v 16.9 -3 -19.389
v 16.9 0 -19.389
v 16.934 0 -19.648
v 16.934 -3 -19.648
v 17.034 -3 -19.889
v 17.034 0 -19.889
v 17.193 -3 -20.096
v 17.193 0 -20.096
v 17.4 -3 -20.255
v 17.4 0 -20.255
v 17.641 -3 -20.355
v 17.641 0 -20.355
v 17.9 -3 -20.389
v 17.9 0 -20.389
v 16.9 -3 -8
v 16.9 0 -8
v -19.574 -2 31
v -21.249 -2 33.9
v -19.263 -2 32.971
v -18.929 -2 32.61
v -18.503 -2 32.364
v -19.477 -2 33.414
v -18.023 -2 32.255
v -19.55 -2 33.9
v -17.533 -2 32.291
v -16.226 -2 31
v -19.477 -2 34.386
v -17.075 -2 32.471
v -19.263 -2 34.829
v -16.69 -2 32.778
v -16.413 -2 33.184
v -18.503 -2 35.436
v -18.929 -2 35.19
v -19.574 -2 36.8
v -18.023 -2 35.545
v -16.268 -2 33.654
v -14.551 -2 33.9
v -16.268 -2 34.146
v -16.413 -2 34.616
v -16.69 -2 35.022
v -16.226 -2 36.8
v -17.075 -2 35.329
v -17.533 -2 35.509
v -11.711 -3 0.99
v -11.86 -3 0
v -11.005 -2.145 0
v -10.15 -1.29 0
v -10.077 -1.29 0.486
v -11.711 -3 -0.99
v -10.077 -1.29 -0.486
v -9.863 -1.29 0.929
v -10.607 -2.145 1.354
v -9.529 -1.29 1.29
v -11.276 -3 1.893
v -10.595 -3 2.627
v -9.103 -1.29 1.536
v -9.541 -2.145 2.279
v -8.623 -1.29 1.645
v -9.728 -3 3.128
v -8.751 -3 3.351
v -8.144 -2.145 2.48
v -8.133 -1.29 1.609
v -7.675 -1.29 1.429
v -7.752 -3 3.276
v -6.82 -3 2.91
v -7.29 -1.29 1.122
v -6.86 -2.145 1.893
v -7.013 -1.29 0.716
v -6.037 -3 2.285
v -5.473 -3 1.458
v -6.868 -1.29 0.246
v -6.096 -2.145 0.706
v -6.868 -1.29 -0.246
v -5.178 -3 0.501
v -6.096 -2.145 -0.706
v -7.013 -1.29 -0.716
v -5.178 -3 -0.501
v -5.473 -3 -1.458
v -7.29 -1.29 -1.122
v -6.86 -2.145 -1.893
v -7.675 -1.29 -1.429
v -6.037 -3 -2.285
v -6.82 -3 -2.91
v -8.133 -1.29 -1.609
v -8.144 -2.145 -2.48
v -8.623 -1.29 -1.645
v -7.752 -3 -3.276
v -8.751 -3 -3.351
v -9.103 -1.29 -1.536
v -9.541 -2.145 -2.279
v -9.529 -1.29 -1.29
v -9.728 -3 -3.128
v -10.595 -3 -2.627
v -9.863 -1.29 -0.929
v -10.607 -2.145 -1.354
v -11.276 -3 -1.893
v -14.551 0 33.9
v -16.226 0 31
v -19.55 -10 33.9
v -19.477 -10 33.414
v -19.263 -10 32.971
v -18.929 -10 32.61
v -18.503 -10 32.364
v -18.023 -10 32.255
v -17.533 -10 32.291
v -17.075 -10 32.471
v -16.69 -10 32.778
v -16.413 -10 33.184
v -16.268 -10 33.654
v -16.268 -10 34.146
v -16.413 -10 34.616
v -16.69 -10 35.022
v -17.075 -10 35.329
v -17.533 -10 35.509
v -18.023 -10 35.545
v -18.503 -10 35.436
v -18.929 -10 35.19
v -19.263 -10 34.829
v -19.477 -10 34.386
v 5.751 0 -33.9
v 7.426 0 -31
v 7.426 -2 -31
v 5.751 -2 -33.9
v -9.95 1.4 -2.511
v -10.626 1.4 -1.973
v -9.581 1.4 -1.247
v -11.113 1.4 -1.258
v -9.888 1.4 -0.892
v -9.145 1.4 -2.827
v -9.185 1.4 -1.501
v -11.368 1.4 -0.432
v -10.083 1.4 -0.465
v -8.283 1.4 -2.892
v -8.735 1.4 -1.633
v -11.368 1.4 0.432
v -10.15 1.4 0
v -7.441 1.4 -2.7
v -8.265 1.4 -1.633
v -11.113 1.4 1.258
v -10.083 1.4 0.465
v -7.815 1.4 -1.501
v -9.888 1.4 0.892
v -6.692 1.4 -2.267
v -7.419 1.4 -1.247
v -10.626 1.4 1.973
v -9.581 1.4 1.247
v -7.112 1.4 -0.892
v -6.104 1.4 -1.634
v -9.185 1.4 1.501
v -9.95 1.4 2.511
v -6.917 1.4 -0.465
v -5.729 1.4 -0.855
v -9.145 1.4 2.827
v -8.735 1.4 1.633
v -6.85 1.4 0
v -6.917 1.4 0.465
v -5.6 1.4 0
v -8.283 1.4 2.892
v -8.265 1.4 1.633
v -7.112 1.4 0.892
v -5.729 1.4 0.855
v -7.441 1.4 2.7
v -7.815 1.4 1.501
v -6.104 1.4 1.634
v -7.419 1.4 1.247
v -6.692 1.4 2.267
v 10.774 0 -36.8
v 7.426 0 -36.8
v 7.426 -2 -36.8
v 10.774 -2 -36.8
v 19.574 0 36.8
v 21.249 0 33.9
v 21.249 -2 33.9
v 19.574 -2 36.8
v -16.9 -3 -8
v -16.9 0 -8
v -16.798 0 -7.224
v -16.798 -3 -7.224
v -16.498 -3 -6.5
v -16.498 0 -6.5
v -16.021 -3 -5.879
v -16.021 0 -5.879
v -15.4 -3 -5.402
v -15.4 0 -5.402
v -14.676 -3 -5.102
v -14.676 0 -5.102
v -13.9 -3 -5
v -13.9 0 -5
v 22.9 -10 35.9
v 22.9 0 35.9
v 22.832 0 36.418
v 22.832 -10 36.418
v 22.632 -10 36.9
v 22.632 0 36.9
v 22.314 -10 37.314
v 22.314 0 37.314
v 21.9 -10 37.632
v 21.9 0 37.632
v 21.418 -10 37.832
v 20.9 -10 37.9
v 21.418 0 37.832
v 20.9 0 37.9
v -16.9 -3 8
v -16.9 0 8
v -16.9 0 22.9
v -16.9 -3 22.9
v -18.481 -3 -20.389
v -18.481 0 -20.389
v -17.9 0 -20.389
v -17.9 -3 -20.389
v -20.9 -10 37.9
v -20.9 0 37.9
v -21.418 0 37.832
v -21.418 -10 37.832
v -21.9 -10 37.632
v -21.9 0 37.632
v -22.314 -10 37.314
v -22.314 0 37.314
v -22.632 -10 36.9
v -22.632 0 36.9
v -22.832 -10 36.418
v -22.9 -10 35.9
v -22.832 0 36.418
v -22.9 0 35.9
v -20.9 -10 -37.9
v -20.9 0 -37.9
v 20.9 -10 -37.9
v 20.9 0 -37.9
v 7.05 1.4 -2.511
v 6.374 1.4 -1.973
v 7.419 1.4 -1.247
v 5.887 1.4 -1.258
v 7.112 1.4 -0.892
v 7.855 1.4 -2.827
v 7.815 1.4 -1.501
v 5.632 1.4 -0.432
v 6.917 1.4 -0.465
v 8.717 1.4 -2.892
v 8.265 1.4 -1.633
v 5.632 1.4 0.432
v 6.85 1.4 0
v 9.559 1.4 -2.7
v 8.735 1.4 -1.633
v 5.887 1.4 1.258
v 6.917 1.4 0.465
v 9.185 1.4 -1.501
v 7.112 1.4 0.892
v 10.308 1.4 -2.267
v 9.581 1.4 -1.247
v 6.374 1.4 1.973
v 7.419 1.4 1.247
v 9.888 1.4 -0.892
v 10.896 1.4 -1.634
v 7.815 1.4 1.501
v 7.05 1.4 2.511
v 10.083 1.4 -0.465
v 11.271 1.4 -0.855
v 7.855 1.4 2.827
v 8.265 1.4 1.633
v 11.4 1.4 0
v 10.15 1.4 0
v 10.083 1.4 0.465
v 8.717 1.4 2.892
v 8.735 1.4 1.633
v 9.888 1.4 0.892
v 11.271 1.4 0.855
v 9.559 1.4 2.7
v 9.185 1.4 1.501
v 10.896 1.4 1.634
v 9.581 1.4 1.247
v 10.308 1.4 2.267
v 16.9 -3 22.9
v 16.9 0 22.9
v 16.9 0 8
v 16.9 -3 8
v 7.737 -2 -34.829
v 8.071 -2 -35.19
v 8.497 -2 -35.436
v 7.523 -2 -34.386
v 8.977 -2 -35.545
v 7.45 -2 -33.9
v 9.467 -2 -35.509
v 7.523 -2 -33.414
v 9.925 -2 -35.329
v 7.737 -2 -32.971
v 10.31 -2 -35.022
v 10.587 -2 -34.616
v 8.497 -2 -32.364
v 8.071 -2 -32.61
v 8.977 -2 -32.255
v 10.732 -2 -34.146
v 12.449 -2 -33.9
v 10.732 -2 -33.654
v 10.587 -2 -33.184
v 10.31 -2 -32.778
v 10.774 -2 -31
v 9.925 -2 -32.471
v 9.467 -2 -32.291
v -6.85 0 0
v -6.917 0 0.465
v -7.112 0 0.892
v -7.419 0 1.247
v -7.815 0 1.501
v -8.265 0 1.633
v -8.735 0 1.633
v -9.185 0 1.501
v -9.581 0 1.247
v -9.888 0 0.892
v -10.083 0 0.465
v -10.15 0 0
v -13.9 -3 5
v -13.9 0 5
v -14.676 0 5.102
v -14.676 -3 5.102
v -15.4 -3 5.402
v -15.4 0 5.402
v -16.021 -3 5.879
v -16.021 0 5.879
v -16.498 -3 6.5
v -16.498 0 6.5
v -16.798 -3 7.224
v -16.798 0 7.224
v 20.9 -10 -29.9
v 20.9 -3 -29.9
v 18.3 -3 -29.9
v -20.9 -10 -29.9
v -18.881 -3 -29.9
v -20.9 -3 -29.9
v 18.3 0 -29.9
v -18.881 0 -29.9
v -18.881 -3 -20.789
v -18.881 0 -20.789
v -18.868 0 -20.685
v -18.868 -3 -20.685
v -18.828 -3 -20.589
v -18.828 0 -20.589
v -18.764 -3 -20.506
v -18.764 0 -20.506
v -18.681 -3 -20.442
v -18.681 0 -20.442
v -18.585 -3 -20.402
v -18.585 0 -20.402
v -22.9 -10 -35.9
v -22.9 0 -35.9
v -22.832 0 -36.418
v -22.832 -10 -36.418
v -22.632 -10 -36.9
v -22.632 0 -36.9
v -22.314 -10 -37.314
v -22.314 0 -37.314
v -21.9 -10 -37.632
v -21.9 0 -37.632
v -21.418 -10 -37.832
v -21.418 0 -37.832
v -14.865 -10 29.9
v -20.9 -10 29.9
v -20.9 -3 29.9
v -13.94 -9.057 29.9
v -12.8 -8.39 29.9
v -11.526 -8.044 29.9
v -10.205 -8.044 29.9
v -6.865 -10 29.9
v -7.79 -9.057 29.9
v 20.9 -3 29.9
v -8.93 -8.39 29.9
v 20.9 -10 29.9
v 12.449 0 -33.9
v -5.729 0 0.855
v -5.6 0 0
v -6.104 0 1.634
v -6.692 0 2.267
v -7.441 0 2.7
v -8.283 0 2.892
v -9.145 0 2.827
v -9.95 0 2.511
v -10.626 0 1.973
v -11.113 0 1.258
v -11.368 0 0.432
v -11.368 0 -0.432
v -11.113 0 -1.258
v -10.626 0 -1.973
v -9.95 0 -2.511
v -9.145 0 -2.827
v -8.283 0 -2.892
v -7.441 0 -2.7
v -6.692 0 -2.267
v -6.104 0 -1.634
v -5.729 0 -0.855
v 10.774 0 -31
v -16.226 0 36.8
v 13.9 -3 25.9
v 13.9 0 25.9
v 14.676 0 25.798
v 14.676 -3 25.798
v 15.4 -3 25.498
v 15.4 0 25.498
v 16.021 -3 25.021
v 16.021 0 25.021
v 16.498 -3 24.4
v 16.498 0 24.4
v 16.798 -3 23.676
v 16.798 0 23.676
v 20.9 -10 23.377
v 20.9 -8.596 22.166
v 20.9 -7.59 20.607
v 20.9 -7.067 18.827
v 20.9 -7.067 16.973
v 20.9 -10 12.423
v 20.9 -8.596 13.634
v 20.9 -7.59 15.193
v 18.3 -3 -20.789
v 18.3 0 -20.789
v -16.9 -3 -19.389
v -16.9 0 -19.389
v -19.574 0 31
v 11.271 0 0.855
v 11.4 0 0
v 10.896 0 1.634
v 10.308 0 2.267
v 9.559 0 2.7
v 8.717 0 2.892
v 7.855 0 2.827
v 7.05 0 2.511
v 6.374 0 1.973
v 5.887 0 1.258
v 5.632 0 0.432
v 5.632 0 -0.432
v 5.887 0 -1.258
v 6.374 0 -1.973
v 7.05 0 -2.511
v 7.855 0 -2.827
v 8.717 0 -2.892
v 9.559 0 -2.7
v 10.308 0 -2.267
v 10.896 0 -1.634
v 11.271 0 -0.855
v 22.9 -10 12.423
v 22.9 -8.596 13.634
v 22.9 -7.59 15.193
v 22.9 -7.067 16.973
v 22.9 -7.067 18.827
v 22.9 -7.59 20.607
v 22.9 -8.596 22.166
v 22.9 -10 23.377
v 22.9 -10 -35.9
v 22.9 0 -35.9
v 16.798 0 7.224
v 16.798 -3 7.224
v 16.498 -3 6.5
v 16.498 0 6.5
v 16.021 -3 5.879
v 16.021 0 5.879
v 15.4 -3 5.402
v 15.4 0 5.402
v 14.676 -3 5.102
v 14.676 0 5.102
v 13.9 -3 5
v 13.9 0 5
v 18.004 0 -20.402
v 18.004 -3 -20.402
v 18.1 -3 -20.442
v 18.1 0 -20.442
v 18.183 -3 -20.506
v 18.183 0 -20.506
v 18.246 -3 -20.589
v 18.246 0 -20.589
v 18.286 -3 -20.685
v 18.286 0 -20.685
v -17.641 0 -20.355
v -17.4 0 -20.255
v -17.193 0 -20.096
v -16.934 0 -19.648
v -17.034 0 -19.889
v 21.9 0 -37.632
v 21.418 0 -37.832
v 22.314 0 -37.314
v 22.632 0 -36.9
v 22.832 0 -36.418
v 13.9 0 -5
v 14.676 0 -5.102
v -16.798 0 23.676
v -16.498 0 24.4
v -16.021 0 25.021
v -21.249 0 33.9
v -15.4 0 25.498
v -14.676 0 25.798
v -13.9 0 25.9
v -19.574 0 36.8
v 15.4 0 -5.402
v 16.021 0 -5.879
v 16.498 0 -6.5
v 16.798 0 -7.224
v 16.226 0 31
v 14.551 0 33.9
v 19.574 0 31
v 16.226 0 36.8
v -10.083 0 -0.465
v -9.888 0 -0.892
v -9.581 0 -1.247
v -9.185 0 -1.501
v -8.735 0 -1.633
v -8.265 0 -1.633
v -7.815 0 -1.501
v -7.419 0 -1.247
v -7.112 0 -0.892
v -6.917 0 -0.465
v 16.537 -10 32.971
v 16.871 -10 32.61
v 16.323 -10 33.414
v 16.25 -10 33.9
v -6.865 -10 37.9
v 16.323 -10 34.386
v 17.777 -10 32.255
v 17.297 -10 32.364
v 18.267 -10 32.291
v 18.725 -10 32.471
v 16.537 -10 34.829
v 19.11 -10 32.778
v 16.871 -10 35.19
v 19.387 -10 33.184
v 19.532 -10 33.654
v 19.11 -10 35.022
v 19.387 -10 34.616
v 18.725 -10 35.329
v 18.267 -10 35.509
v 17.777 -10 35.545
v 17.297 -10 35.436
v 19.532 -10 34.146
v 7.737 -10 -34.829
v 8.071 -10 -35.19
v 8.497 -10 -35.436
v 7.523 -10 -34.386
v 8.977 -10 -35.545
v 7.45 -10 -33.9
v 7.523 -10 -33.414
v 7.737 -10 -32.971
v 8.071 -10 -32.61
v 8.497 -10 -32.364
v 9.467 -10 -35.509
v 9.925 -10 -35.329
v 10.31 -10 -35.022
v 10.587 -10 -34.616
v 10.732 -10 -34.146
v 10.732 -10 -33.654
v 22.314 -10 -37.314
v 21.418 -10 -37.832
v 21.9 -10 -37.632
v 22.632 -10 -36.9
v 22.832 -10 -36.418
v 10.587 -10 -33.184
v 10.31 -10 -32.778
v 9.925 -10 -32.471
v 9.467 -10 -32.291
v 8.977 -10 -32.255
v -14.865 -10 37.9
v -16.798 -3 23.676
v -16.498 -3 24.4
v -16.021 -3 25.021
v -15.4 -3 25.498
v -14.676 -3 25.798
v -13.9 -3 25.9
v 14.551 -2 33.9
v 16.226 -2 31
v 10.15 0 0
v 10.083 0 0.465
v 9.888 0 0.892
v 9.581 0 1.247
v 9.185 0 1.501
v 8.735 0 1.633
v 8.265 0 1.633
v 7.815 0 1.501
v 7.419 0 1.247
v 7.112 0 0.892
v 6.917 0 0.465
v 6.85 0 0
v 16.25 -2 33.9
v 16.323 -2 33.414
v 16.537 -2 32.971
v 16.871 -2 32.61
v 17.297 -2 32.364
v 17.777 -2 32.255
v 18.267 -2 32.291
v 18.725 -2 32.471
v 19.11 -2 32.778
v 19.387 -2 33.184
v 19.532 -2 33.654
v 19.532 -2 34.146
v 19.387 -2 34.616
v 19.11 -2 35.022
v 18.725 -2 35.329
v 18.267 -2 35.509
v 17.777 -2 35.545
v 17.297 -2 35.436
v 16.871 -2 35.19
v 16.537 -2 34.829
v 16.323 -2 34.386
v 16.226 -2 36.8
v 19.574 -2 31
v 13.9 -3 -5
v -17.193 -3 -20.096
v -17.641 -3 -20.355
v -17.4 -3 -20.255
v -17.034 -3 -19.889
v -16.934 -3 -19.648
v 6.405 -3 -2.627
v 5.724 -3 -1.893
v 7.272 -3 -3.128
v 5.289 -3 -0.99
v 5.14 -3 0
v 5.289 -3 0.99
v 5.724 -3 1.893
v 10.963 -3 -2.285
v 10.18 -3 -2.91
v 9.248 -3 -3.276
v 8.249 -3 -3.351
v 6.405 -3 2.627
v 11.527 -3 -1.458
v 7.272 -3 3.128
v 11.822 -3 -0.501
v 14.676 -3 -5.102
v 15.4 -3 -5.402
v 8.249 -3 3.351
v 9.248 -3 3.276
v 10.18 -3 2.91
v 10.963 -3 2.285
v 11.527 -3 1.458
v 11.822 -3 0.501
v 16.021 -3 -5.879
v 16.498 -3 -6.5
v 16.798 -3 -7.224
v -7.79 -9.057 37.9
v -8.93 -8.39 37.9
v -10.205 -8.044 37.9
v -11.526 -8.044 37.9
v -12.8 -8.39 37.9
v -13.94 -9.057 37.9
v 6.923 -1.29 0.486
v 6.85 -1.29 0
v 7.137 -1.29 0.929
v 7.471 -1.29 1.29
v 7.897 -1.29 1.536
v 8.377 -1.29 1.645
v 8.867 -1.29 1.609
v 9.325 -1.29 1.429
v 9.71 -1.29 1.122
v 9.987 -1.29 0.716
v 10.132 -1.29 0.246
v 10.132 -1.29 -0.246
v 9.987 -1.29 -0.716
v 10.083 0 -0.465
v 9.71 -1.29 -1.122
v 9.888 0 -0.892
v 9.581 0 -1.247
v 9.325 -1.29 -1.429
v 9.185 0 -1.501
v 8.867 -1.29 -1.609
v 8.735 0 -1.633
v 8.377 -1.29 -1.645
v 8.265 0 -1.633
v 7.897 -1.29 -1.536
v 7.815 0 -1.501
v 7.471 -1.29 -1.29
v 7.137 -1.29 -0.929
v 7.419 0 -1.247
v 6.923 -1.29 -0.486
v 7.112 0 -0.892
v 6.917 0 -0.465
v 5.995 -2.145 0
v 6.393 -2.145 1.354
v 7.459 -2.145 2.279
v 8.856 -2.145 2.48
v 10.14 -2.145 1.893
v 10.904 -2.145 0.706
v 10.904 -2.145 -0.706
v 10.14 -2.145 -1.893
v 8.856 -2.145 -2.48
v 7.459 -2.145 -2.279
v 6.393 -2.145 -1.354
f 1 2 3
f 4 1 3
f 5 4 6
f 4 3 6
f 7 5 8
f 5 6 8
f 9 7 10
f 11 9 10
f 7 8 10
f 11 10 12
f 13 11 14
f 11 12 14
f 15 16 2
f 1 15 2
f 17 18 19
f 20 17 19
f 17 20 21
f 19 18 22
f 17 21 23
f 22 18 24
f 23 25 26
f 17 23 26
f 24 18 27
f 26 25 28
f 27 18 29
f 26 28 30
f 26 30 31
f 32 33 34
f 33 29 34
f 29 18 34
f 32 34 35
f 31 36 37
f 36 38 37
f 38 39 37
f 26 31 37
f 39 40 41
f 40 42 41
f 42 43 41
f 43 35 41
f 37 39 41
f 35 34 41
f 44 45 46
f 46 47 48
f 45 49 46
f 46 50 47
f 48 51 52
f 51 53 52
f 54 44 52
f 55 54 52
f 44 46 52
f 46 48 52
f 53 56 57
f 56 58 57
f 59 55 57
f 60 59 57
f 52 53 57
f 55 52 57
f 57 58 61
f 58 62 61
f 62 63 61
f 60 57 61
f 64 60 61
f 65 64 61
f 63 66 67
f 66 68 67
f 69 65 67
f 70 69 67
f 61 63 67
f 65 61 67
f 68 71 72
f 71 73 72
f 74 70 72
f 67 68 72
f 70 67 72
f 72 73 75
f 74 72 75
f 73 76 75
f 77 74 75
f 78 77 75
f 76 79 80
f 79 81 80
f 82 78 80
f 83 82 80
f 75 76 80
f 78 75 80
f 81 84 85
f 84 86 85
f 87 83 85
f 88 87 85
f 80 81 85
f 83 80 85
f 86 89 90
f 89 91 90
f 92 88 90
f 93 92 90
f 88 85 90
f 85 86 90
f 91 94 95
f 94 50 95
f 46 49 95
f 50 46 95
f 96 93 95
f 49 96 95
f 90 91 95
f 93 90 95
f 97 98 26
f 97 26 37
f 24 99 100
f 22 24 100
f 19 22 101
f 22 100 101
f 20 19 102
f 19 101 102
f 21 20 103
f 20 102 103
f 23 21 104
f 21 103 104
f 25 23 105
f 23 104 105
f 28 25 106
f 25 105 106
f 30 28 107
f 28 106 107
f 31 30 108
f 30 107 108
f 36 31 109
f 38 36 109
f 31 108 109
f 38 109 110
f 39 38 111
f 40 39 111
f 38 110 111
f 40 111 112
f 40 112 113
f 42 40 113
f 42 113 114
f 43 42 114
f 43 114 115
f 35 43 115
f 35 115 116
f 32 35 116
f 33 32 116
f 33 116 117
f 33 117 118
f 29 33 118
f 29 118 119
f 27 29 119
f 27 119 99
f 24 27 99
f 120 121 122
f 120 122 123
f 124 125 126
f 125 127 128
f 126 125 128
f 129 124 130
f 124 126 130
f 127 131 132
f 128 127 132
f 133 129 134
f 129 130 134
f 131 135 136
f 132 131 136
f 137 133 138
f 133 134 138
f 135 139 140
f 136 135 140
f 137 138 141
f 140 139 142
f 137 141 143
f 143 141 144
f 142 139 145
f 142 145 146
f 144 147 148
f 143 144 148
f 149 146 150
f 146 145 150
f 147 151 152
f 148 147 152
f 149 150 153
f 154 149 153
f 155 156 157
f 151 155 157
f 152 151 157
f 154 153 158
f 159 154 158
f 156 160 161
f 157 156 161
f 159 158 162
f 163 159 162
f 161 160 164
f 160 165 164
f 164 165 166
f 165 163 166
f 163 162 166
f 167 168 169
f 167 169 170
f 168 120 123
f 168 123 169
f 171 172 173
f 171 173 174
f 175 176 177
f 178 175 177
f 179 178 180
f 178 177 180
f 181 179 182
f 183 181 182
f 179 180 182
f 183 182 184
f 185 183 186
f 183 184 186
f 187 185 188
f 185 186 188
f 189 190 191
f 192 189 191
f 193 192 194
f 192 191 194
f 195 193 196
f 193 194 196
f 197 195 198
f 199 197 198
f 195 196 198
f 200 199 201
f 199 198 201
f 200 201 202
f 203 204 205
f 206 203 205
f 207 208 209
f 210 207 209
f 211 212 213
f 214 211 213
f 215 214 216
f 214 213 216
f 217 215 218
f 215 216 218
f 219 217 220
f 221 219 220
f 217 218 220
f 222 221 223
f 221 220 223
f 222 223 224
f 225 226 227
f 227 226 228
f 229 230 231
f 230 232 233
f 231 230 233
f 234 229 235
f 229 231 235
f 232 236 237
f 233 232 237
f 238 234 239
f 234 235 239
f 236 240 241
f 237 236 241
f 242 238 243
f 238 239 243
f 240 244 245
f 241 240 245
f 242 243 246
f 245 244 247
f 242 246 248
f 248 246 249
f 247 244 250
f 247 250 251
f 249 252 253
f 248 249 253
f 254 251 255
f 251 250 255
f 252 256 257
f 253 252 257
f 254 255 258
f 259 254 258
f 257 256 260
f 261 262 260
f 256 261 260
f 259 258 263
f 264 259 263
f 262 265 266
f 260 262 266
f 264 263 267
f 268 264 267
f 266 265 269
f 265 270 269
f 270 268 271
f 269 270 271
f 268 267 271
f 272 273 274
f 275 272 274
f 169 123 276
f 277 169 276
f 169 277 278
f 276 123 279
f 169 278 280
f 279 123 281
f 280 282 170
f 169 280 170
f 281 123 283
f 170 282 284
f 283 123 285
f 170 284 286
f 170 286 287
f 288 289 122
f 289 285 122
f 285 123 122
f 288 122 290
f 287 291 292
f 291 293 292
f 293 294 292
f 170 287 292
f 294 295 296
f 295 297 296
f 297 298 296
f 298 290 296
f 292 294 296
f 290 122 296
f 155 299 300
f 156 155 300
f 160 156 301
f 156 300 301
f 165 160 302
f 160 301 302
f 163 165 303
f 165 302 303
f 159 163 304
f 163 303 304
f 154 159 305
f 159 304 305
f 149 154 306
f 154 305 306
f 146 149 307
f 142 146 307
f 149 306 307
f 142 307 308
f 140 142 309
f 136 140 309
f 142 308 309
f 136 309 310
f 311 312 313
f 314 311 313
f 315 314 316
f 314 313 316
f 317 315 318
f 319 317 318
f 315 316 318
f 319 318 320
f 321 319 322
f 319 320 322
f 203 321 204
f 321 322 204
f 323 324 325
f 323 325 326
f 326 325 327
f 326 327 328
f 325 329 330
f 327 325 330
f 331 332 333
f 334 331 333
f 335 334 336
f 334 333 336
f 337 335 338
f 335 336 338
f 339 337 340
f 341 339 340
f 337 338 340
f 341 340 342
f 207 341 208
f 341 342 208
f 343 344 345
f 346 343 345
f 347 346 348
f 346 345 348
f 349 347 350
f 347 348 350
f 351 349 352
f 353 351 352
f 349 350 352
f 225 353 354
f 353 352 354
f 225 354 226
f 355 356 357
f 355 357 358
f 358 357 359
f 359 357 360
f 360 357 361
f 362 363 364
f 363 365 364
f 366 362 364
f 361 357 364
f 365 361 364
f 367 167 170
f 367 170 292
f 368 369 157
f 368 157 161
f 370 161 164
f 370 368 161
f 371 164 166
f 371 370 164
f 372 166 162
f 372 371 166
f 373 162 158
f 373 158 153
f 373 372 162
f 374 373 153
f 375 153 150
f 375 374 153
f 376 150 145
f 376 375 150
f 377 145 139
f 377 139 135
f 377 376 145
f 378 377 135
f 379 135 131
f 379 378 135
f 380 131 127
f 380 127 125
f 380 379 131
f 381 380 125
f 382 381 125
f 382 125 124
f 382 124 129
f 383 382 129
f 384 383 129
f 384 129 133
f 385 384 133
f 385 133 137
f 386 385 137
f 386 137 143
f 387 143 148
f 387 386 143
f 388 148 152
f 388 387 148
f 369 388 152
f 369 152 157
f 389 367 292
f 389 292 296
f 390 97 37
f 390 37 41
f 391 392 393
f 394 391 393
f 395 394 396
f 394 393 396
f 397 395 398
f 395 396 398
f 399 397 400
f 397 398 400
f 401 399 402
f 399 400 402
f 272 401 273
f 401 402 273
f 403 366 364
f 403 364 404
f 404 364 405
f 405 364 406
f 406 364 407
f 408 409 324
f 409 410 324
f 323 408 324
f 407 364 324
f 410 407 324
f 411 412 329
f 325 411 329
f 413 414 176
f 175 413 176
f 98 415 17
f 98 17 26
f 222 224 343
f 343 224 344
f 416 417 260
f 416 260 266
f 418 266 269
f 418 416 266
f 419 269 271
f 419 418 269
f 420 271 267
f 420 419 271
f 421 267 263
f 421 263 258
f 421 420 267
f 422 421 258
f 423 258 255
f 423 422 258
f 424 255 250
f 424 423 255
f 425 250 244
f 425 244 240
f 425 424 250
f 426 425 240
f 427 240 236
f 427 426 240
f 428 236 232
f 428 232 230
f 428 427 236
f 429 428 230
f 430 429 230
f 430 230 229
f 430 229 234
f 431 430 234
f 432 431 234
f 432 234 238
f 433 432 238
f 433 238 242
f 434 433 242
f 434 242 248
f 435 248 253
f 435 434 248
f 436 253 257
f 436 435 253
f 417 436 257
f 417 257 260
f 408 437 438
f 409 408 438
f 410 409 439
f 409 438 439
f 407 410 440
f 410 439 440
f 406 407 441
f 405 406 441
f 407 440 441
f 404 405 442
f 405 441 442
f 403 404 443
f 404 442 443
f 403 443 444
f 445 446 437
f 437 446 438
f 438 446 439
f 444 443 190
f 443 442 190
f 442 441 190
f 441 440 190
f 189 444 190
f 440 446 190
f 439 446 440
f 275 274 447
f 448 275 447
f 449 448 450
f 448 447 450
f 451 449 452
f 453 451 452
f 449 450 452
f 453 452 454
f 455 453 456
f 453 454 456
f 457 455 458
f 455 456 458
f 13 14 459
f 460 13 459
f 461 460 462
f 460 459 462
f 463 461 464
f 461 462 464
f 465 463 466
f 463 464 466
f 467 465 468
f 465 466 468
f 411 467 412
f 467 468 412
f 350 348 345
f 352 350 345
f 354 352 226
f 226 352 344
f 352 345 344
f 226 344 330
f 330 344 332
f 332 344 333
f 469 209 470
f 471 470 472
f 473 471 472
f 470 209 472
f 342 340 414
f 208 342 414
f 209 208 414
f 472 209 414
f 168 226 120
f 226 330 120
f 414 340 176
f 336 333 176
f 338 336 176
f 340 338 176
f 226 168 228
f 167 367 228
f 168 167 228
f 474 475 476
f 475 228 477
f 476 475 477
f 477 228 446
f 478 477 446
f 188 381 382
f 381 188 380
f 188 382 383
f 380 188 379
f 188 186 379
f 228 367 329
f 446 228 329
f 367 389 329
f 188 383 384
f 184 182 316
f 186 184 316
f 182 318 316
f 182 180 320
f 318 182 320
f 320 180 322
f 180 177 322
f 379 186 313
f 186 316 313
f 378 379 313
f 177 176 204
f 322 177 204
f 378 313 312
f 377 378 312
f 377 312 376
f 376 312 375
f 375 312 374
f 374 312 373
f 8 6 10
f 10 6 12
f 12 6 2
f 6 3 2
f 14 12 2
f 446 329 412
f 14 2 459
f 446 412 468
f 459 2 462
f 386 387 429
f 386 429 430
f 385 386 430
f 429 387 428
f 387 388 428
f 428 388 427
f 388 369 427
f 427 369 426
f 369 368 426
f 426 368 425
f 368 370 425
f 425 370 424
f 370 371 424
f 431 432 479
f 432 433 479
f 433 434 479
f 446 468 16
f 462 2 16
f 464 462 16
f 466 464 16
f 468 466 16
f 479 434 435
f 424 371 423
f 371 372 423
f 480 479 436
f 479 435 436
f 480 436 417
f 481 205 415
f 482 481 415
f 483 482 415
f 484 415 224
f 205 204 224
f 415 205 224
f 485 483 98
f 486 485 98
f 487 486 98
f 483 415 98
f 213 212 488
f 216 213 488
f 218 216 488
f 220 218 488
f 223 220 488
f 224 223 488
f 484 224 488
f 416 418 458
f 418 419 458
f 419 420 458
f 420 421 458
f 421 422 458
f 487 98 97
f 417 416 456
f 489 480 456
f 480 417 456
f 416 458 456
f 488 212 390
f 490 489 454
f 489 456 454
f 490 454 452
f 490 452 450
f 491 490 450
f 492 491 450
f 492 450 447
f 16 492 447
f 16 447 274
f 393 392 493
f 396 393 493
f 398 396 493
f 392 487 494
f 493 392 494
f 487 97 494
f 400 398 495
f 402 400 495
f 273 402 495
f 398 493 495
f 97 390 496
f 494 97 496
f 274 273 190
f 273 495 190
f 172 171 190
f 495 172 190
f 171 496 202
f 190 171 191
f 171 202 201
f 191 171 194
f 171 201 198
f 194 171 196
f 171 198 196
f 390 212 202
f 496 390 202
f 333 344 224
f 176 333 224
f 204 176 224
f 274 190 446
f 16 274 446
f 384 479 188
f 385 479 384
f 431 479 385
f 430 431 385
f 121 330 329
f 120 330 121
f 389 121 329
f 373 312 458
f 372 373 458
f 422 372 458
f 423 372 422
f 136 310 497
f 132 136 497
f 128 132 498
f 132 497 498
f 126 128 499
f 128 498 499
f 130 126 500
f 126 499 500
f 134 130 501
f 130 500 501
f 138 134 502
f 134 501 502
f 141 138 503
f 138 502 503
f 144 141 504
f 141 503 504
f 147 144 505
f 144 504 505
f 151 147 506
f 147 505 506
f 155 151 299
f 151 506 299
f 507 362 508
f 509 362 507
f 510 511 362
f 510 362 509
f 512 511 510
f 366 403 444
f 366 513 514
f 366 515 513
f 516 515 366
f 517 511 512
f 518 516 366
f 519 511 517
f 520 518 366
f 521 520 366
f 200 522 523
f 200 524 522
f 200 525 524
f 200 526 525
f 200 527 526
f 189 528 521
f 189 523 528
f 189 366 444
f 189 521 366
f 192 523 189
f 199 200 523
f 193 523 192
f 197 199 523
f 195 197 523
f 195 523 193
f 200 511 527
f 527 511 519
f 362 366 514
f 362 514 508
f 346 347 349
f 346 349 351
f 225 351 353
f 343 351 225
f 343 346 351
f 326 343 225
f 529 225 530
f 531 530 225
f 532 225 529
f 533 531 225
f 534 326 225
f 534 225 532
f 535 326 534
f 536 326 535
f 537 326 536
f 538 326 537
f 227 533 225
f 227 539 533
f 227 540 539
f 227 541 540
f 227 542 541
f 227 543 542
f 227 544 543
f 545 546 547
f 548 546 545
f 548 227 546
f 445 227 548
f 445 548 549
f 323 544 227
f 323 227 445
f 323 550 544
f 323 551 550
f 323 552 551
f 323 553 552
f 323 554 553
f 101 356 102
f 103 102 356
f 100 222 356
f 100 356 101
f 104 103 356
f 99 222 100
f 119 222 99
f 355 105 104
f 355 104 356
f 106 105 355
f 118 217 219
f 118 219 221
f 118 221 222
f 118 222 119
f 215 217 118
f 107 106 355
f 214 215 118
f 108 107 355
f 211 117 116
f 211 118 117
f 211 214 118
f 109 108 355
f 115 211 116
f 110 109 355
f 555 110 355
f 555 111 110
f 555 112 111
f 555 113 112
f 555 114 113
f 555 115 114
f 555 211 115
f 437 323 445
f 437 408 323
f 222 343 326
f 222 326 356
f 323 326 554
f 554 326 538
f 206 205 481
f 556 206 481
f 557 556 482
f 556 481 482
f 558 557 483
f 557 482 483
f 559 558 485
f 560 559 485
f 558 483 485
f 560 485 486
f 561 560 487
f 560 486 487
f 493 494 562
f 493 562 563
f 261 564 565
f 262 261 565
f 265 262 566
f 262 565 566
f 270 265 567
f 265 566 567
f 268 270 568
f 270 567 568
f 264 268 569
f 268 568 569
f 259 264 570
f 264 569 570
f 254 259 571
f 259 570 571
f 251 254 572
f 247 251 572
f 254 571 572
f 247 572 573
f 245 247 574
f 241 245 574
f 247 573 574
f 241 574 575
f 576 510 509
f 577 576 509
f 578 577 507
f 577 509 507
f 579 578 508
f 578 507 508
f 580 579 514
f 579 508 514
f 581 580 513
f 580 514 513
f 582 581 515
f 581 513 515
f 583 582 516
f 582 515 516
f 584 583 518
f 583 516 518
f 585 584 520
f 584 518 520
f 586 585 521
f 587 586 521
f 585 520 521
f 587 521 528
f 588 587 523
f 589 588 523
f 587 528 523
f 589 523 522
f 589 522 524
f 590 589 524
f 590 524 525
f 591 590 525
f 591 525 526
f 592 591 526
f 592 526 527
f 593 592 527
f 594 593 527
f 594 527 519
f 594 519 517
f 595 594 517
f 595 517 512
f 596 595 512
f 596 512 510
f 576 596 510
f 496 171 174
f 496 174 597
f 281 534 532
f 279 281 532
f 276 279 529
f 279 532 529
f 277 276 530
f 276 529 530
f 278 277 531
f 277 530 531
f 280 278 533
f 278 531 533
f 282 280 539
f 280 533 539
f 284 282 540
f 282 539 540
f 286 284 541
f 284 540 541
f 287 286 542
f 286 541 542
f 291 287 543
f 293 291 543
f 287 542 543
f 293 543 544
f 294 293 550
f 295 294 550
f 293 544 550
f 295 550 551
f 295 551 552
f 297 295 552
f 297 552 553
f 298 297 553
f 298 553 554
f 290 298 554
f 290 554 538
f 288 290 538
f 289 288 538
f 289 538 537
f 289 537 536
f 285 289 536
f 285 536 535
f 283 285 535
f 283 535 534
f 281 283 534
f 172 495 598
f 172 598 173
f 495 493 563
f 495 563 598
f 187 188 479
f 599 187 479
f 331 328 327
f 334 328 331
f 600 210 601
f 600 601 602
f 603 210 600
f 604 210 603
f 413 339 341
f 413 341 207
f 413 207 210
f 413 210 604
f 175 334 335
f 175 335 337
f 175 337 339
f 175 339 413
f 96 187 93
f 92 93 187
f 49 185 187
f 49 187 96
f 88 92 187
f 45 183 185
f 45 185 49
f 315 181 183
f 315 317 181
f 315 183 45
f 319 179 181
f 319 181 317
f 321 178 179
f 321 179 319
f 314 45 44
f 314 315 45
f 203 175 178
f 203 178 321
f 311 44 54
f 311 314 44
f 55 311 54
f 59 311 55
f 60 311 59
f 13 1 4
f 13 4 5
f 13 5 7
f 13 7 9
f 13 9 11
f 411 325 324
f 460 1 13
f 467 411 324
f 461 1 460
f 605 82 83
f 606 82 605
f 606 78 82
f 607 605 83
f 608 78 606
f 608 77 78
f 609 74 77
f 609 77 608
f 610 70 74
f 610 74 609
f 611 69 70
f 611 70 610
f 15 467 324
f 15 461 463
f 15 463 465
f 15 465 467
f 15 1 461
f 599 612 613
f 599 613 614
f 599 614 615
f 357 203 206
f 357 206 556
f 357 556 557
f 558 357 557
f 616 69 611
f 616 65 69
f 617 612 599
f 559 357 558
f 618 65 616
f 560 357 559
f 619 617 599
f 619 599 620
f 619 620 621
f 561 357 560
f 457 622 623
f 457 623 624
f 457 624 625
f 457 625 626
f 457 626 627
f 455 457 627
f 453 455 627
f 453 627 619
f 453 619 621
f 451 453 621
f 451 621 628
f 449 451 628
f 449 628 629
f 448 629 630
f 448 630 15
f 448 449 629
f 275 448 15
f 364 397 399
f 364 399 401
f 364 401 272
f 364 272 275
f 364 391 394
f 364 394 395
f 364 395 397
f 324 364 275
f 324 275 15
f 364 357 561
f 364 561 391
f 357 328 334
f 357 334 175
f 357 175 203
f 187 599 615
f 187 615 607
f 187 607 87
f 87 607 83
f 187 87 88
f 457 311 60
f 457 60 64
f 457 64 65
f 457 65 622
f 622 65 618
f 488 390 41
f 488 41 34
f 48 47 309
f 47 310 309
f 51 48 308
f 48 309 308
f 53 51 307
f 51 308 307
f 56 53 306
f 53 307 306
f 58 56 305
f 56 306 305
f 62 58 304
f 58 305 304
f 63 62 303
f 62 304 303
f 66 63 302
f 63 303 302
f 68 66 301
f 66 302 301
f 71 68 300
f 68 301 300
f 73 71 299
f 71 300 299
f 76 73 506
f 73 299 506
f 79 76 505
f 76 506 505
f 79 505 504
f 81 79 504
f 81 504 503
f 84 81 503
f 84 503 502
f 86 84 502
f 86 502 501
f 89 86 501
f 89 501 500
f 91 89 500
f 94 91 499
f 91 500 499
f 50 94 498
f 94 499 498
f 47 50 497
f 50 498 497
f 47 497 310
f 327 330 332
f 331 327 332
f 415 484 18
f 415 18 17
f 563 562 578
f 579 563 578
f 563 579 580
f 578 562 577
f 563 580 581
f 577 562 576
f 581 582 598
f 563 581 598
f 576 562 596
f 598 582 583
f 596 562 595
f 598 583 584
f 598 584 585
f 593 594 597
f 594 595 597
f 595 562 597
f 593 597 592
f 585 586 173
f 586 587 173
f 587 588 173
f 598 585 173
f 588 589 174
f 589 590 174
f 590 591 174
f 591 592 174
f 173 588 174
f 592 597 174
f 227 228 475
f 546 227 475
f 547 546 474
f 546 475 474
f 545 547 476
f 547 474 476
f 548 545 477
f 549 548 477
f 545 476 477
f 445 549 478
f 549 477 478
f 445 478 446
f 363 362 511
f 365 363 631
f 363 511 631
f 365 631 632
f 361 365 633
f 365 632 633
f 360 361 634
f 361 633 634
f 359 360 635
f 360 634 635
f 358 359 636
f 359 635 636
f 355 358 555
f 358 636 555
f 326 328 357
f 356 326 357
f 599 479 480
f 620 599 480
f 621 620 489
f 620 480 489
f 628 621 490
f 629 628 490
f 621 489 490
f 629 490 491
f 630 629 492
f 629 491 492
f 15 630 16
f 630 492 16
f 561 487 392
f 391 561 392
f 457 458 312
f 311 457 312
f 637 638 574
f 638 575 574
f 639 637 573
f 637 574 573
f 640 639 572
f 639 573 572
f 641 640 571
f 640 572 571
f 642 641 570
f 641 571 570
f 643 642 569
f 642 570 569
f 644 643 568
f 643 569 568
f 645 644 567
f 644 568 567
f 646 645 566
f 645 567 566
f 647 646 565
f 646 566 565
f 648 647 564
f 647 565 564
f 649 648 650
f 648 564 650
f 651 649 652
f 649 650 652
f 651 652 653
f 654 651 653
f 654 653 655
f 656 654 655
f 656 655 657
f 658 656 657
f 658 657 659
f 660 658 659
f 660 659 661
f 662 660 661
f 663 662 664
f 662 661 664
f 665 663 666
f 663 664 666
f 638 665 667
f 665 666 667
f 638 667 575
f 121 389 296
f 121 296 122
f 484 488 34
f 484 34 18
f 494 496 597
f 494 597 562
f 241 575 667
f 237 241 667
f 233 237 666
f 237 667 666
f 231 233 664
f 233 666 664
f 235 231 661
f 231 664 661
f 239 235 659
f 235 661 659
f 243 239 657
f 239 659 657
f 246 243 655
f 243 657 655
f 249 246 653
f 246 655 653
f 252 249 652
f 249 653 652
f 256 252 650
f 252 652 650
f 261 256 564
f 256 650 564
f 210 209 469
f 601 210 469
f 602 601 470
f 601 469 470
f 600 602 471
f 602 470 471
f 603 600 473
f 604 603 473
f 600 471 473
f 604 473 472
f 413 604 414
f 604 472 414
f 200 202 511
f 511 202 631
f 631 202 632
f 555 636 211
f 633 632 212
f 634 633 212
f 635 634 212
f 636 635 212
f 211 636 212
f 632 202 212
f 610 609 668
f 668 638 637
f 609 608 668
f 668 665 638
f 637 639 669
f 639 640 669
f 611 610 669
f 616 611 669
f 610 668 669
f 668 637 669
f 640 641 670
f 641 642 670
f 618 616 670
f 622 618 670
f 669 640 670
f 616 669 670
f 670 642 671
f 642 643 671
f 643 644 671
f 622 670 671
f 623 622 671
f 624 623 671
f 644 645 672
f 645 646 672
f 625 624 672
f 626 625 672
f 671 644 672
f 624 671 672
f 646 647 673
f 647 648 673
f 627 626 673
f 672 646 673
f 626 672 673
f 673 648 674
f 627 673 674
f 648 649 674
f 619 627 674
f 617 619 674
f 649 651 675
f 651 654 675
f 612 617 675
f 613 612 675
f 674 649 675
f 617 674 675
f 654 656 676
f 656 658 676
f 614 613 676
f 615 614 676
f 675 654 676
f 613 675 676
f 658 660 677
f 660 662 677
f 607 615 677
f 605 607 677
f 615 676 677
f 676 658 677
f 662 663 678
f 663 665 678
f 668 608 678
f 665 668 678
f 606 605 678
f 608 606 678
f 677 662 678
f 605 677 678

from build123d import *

# Parameters (mm, degrees)
F1_DEPTH        = 10
F0_R            = 2.9
F2_DEPTH        = 3
F3_R            = 6.5
F4_DEPTH        = 4
F5_R            = 5
F6_DEPTH        = 12
F7_DEPTH        = 2
F8_D            = 3.3
F8_DEPTH        = 13.8
F8_START        = 2
F8_TIP          = 0.9914200214
F9_DEPTH        = 1.4
F10_D           = 3.3
F10_DEPTH       = 8
F10_TIP         = 0.9914200214
F12_D           = 3.3
F12_DEPTH       = 8
F12_CSINK_D     = 6.72
F12_CSINK_ANGLE = 90
F12_TIP         = 0.9914200214


with BuildPart() as f1:
    # F0 (on Front) → F1 (new body)
    with BuildSketch(Plane.XZ):
        with BuildLine():
            Line((20.9, 37.9), (17.9, 37.9))
            Line((17.9, 37.9), (-17.9, 37.9))
            Line((-17.9, 37.9), (-20.9, 37.9))
            ThreePointArc((-20.9, 37.9), (-22.3142135624, 37.3142135624), (-22.9, 35.9))
            Line((-22.9, 35.9), (-22.9, 32.9))
            Line((-22.9, 32.9), (-22.9, -35.9))
            ThreePointArc((-22.9, -35.9), (-22.3142135624, -37.3142135624), (-20.9, -37.9))
            Line((-20.9, -37.9), (20.9, -37.9))
            ThreePointArc((20.9, -37.9), (22.3142135624, -37.3142135624), (22.9, -35.9))
            Line((22.9, -35.9), (22.9, 32.9))
            Line((22.9, 32.9), (22.9, 35.9))
            ThreePointArc((22.9, 35.9), (22.3142135624, 37.3142135624), (20.9, 37.9))
        make_face()
        Polygon((7.4256842194, -31), (10.7743157806, -31), (12.4486315613, -33.9), (10.7743157806, -36.8), (7.4256842194, -36.8), (5.7513684387, -33.9), align=None, mode=Mode.SUBTRACT)
        Polygon((-16.2256842194, 36.8), (-14.5513684387, 33.9), (-16.2256842194, 31), (-19.5743157806, 31), (-21.2486315613, 33.9), (-19.5743157806, 36.8), align=None, mode=Mode.SUBTRACT)
        Polygon((20.9, 29.9), (20.9, -29.9), (18.3, -29.9), (-18.8811943151, -29.9), (-20.9, -29.9), (-20.9, 29.9), align=None, mode=Mode.SUBTRACT)
        Polygon((21.2486315613, 33.9), (19.5743157806, 31), (16.2256842194, 31), (14.5513684387, 33.9), (16.2256842194, 36.8), (19.5743157806, 36.8), align=None, mode=Mode.SUBTRACT)
        Polygon((-16.2256842194, 31), (-14.5513684387, 33.9), (-16.2256842194, 36.8), (-19.5743157806, 36.8), (-21.2486315613, 33.9), (-19.5743157806, 31), align=None)
        Polygon((16.2256842194, 31), (19.5743157806, 31), (21.2486315613, 33.9), (19.5743157806, 36.8), (16.2256842194, 36.8), (14.5513684387, 33.9), align=None)
        Polygon((12.4486315613, -33.9), (10.7743157806, -31), (7.4256842194, -31), (5.7513684387, -33.9), (7.4256842194, -36.8), (10.7743157806, -36.8), align=None)
    extrude(amount=F1_DEPTH)

    # F0 (on Front) → F2 (join)
    with BuildSketch(Plane.XZ):
        with BuildLine():
            Line((18.3, -29.9), (20.9, -29.9))
            Line((20.9, -29.9), (20.9, 29.9))
            Line((20.9, 29.9), (-20.9, 29.9))
            Line((-20.9, 29.9), (-20.9, -29.9))
            Line((-20.9, -29.9), (-18.8811943151, -29.9))
            Line((-18.8811943151, -29.9), (-18.8811943151, -20.7887917079))
            ThreePointArc((-18.8811943151, -20.7887917079), (-18.7640370276, -20.5059489954), (-18.4811943151, -20.3887917079))
            Line((-18.4811943151, -20.3887917079), (-17.9, -20.3887917079))
            ThreePointArc((-17.9, -20.3887917079), (-17.1928932188, -20.0958984891), (-16.9, -19.3887917079))
            Line((-16.9, -19.3887917079), (-16.9, -8))
            ThreePointArc((-16.9, -8), (-16.0213203436, -5.8786796564), (-13.9, -5))
            Line((-13.9, -5), (13.9, -5))
            ThreePointArc((13.9, -5), (16.0213203436, -5.8786796564), (16.9, -8))
            Line((16.9, -8), (16.9, -19.3887917079))
            ThreePointArc((16.9, -19.3887917079), (17.1928932188, -20.0958984891), (17.9, -20.3887917079))
            ThreePointArc((17.9, -20.3887917079), (18.1828427125, -20.5059489954), (18.3, -20.7887917079))
            Line((18.3, -20.7887917079), (18.3, -29.9))
        make_face()
        with Locations((-8.5, 0)):
            Circle(F0_R, mode=Mode.SUBTRACT)
        with Locations((8.5, 0)):
            Circle(F0_R, mode=Mode.SUBTRACT)
        with BuildLine():
            ThreePointArc((-16.9, 22.9), (-16.0213203436, 25.0213203436), (-13.9, 25.9))
            Line((-13.9, 25.9), (13.9, 25.9))
            ThreePointArc((13.9, 25.9), (16.0213203436, 25.0213203436), (16.9, 22.9))
            Line((16.9, 22.9), (16.9, 8))
            ThreePointArc((16.9, 8), (16.0213203436, 5.8786796564), (13.9, 5))
            Line((13.9, 5), (-13.9, 5))
            ThreePointArc((-13.9, 5), (-16.0213203436, 5.8786796564), (-16.9, 8))
            Line((-16.9, 8), (-16.9, 22.9))
        make_face(mode=Mode.SUBTRACT)
        with Locations((-8.5, 0)):
            Circle(F0_R)
        with Locations((8.5, 0)):
            Circle(F0_R)
    extrude(amount=F2_DEPTH)

    # F3 (on face) → F4 (cut)
    with BuildSketch(Plane.YZ.offset(22.9)):
        with Locations((-13.5, 17.9)):
            Circle(F3_R)
    extrude(amount=-F4_DEPTH, mode=Mode.SUBTRACT)

    # F5 (on face) → F6 (cut)
    with BuildSketch(Plane.XY.offset(37.9)):
        with Locations((-10.8651584014, -13)):
            Circle(F5_R)
    extrude(amount=-F6_DEPTH, mode=Mode.SUBTRACT)

    # F0 (on Front) → F7 (cut)
    with BuildSketch(Plane.XZ):
        Polygon((-16.2256842194, 31), (-14.5513684387, 33.9), (-16.2256842194, 36.8), (-19.5743157806, 36.8), (-21.2486315613, 33.9), (-19.5743157806, 31), align=None)
        Polygon((16.2256842194, 31), (19.5743157806, 31), (21.2486315613, 33.9), (19.5743157806, 36.8), (16.2256842194, 36.8), (14.5513684387, 33.9), align=None)
        Polygon((12.4486315613, -33.9), (10.7743157806, -31), (7.4256842194, -31), (5.7513684387, -33.9), (7.4256842194, -36.8), (10.7743157806, -36.8), align=None)
    extrude(amount=F7_DEPTH, mode=Mode.SUBTRACT)

    # F8
    # its depths count from where the whole tool has entered the part; down to there all is cleared
    with Locations(Plane(origin=(0, 0, 0), x_dir=(1, 0, 0), z_dir=(0, 1, 0)).offset(-F8_START)):
        with Locations((-17.9, -33.9), (17.9, -33.9), (9.1, 33.9)):
            Hole(F8_D / 2, depth=F8_DEPTH)
            with Locations((0, 0, -(F8_DEPTH + F8_TIP / 2))):  # 118° drill point
                Cone(0, F8_D / 2, F8_TIP, mode=Mode.SUBTRACT)

    # F0 (on Front) → F9 (join)
    with BuildSketch(Plane.XZ):
        with Locations((8.5, 0)):
            Circle(F0_R)
        with Locations((-8.5, 0)):
            Circle(F0_R)
    extrude(amount=-F9_DEPTH)

    # F10 (one way)
    with BuildSketch(Plane.XZ):
        with Locations((-8.5, 0), (8.5, 0)):
            Circle(F10_D / 2)
    extrude(amount=-F10_DEPTH, mode=Mode.SUBTRACT)
    with Locations(Plane.XZ):
        with Locations((-8.5, 0), (8.5, 0)):
            with Locations((0, 0, -(F10_DEPTH + F10_TIP / 2))):  # 118° drill point
                Cone(0, F10_D / 2, F10_TIP, mode=Mode.SUBTRACT)

    # F12
    with Locations(Plane.XZ.offset(3)):
        with Locations((-8.5, 0), (8.5, 0)):
            CounterSinkHole(F12_D / 2, F12_CSINK_D / 2, depth=F12_DEPTH, counter_sink_angle=F12_CSINK_ANGLE)
            with Locations((0, 0, -(F12_DEPTH + F12_TIP / 2))):  # 118° drill point
                Cone(0, F12_D / 2, F12_TIP, mode=Mode.SUBTRACT)


solid = f1.part
